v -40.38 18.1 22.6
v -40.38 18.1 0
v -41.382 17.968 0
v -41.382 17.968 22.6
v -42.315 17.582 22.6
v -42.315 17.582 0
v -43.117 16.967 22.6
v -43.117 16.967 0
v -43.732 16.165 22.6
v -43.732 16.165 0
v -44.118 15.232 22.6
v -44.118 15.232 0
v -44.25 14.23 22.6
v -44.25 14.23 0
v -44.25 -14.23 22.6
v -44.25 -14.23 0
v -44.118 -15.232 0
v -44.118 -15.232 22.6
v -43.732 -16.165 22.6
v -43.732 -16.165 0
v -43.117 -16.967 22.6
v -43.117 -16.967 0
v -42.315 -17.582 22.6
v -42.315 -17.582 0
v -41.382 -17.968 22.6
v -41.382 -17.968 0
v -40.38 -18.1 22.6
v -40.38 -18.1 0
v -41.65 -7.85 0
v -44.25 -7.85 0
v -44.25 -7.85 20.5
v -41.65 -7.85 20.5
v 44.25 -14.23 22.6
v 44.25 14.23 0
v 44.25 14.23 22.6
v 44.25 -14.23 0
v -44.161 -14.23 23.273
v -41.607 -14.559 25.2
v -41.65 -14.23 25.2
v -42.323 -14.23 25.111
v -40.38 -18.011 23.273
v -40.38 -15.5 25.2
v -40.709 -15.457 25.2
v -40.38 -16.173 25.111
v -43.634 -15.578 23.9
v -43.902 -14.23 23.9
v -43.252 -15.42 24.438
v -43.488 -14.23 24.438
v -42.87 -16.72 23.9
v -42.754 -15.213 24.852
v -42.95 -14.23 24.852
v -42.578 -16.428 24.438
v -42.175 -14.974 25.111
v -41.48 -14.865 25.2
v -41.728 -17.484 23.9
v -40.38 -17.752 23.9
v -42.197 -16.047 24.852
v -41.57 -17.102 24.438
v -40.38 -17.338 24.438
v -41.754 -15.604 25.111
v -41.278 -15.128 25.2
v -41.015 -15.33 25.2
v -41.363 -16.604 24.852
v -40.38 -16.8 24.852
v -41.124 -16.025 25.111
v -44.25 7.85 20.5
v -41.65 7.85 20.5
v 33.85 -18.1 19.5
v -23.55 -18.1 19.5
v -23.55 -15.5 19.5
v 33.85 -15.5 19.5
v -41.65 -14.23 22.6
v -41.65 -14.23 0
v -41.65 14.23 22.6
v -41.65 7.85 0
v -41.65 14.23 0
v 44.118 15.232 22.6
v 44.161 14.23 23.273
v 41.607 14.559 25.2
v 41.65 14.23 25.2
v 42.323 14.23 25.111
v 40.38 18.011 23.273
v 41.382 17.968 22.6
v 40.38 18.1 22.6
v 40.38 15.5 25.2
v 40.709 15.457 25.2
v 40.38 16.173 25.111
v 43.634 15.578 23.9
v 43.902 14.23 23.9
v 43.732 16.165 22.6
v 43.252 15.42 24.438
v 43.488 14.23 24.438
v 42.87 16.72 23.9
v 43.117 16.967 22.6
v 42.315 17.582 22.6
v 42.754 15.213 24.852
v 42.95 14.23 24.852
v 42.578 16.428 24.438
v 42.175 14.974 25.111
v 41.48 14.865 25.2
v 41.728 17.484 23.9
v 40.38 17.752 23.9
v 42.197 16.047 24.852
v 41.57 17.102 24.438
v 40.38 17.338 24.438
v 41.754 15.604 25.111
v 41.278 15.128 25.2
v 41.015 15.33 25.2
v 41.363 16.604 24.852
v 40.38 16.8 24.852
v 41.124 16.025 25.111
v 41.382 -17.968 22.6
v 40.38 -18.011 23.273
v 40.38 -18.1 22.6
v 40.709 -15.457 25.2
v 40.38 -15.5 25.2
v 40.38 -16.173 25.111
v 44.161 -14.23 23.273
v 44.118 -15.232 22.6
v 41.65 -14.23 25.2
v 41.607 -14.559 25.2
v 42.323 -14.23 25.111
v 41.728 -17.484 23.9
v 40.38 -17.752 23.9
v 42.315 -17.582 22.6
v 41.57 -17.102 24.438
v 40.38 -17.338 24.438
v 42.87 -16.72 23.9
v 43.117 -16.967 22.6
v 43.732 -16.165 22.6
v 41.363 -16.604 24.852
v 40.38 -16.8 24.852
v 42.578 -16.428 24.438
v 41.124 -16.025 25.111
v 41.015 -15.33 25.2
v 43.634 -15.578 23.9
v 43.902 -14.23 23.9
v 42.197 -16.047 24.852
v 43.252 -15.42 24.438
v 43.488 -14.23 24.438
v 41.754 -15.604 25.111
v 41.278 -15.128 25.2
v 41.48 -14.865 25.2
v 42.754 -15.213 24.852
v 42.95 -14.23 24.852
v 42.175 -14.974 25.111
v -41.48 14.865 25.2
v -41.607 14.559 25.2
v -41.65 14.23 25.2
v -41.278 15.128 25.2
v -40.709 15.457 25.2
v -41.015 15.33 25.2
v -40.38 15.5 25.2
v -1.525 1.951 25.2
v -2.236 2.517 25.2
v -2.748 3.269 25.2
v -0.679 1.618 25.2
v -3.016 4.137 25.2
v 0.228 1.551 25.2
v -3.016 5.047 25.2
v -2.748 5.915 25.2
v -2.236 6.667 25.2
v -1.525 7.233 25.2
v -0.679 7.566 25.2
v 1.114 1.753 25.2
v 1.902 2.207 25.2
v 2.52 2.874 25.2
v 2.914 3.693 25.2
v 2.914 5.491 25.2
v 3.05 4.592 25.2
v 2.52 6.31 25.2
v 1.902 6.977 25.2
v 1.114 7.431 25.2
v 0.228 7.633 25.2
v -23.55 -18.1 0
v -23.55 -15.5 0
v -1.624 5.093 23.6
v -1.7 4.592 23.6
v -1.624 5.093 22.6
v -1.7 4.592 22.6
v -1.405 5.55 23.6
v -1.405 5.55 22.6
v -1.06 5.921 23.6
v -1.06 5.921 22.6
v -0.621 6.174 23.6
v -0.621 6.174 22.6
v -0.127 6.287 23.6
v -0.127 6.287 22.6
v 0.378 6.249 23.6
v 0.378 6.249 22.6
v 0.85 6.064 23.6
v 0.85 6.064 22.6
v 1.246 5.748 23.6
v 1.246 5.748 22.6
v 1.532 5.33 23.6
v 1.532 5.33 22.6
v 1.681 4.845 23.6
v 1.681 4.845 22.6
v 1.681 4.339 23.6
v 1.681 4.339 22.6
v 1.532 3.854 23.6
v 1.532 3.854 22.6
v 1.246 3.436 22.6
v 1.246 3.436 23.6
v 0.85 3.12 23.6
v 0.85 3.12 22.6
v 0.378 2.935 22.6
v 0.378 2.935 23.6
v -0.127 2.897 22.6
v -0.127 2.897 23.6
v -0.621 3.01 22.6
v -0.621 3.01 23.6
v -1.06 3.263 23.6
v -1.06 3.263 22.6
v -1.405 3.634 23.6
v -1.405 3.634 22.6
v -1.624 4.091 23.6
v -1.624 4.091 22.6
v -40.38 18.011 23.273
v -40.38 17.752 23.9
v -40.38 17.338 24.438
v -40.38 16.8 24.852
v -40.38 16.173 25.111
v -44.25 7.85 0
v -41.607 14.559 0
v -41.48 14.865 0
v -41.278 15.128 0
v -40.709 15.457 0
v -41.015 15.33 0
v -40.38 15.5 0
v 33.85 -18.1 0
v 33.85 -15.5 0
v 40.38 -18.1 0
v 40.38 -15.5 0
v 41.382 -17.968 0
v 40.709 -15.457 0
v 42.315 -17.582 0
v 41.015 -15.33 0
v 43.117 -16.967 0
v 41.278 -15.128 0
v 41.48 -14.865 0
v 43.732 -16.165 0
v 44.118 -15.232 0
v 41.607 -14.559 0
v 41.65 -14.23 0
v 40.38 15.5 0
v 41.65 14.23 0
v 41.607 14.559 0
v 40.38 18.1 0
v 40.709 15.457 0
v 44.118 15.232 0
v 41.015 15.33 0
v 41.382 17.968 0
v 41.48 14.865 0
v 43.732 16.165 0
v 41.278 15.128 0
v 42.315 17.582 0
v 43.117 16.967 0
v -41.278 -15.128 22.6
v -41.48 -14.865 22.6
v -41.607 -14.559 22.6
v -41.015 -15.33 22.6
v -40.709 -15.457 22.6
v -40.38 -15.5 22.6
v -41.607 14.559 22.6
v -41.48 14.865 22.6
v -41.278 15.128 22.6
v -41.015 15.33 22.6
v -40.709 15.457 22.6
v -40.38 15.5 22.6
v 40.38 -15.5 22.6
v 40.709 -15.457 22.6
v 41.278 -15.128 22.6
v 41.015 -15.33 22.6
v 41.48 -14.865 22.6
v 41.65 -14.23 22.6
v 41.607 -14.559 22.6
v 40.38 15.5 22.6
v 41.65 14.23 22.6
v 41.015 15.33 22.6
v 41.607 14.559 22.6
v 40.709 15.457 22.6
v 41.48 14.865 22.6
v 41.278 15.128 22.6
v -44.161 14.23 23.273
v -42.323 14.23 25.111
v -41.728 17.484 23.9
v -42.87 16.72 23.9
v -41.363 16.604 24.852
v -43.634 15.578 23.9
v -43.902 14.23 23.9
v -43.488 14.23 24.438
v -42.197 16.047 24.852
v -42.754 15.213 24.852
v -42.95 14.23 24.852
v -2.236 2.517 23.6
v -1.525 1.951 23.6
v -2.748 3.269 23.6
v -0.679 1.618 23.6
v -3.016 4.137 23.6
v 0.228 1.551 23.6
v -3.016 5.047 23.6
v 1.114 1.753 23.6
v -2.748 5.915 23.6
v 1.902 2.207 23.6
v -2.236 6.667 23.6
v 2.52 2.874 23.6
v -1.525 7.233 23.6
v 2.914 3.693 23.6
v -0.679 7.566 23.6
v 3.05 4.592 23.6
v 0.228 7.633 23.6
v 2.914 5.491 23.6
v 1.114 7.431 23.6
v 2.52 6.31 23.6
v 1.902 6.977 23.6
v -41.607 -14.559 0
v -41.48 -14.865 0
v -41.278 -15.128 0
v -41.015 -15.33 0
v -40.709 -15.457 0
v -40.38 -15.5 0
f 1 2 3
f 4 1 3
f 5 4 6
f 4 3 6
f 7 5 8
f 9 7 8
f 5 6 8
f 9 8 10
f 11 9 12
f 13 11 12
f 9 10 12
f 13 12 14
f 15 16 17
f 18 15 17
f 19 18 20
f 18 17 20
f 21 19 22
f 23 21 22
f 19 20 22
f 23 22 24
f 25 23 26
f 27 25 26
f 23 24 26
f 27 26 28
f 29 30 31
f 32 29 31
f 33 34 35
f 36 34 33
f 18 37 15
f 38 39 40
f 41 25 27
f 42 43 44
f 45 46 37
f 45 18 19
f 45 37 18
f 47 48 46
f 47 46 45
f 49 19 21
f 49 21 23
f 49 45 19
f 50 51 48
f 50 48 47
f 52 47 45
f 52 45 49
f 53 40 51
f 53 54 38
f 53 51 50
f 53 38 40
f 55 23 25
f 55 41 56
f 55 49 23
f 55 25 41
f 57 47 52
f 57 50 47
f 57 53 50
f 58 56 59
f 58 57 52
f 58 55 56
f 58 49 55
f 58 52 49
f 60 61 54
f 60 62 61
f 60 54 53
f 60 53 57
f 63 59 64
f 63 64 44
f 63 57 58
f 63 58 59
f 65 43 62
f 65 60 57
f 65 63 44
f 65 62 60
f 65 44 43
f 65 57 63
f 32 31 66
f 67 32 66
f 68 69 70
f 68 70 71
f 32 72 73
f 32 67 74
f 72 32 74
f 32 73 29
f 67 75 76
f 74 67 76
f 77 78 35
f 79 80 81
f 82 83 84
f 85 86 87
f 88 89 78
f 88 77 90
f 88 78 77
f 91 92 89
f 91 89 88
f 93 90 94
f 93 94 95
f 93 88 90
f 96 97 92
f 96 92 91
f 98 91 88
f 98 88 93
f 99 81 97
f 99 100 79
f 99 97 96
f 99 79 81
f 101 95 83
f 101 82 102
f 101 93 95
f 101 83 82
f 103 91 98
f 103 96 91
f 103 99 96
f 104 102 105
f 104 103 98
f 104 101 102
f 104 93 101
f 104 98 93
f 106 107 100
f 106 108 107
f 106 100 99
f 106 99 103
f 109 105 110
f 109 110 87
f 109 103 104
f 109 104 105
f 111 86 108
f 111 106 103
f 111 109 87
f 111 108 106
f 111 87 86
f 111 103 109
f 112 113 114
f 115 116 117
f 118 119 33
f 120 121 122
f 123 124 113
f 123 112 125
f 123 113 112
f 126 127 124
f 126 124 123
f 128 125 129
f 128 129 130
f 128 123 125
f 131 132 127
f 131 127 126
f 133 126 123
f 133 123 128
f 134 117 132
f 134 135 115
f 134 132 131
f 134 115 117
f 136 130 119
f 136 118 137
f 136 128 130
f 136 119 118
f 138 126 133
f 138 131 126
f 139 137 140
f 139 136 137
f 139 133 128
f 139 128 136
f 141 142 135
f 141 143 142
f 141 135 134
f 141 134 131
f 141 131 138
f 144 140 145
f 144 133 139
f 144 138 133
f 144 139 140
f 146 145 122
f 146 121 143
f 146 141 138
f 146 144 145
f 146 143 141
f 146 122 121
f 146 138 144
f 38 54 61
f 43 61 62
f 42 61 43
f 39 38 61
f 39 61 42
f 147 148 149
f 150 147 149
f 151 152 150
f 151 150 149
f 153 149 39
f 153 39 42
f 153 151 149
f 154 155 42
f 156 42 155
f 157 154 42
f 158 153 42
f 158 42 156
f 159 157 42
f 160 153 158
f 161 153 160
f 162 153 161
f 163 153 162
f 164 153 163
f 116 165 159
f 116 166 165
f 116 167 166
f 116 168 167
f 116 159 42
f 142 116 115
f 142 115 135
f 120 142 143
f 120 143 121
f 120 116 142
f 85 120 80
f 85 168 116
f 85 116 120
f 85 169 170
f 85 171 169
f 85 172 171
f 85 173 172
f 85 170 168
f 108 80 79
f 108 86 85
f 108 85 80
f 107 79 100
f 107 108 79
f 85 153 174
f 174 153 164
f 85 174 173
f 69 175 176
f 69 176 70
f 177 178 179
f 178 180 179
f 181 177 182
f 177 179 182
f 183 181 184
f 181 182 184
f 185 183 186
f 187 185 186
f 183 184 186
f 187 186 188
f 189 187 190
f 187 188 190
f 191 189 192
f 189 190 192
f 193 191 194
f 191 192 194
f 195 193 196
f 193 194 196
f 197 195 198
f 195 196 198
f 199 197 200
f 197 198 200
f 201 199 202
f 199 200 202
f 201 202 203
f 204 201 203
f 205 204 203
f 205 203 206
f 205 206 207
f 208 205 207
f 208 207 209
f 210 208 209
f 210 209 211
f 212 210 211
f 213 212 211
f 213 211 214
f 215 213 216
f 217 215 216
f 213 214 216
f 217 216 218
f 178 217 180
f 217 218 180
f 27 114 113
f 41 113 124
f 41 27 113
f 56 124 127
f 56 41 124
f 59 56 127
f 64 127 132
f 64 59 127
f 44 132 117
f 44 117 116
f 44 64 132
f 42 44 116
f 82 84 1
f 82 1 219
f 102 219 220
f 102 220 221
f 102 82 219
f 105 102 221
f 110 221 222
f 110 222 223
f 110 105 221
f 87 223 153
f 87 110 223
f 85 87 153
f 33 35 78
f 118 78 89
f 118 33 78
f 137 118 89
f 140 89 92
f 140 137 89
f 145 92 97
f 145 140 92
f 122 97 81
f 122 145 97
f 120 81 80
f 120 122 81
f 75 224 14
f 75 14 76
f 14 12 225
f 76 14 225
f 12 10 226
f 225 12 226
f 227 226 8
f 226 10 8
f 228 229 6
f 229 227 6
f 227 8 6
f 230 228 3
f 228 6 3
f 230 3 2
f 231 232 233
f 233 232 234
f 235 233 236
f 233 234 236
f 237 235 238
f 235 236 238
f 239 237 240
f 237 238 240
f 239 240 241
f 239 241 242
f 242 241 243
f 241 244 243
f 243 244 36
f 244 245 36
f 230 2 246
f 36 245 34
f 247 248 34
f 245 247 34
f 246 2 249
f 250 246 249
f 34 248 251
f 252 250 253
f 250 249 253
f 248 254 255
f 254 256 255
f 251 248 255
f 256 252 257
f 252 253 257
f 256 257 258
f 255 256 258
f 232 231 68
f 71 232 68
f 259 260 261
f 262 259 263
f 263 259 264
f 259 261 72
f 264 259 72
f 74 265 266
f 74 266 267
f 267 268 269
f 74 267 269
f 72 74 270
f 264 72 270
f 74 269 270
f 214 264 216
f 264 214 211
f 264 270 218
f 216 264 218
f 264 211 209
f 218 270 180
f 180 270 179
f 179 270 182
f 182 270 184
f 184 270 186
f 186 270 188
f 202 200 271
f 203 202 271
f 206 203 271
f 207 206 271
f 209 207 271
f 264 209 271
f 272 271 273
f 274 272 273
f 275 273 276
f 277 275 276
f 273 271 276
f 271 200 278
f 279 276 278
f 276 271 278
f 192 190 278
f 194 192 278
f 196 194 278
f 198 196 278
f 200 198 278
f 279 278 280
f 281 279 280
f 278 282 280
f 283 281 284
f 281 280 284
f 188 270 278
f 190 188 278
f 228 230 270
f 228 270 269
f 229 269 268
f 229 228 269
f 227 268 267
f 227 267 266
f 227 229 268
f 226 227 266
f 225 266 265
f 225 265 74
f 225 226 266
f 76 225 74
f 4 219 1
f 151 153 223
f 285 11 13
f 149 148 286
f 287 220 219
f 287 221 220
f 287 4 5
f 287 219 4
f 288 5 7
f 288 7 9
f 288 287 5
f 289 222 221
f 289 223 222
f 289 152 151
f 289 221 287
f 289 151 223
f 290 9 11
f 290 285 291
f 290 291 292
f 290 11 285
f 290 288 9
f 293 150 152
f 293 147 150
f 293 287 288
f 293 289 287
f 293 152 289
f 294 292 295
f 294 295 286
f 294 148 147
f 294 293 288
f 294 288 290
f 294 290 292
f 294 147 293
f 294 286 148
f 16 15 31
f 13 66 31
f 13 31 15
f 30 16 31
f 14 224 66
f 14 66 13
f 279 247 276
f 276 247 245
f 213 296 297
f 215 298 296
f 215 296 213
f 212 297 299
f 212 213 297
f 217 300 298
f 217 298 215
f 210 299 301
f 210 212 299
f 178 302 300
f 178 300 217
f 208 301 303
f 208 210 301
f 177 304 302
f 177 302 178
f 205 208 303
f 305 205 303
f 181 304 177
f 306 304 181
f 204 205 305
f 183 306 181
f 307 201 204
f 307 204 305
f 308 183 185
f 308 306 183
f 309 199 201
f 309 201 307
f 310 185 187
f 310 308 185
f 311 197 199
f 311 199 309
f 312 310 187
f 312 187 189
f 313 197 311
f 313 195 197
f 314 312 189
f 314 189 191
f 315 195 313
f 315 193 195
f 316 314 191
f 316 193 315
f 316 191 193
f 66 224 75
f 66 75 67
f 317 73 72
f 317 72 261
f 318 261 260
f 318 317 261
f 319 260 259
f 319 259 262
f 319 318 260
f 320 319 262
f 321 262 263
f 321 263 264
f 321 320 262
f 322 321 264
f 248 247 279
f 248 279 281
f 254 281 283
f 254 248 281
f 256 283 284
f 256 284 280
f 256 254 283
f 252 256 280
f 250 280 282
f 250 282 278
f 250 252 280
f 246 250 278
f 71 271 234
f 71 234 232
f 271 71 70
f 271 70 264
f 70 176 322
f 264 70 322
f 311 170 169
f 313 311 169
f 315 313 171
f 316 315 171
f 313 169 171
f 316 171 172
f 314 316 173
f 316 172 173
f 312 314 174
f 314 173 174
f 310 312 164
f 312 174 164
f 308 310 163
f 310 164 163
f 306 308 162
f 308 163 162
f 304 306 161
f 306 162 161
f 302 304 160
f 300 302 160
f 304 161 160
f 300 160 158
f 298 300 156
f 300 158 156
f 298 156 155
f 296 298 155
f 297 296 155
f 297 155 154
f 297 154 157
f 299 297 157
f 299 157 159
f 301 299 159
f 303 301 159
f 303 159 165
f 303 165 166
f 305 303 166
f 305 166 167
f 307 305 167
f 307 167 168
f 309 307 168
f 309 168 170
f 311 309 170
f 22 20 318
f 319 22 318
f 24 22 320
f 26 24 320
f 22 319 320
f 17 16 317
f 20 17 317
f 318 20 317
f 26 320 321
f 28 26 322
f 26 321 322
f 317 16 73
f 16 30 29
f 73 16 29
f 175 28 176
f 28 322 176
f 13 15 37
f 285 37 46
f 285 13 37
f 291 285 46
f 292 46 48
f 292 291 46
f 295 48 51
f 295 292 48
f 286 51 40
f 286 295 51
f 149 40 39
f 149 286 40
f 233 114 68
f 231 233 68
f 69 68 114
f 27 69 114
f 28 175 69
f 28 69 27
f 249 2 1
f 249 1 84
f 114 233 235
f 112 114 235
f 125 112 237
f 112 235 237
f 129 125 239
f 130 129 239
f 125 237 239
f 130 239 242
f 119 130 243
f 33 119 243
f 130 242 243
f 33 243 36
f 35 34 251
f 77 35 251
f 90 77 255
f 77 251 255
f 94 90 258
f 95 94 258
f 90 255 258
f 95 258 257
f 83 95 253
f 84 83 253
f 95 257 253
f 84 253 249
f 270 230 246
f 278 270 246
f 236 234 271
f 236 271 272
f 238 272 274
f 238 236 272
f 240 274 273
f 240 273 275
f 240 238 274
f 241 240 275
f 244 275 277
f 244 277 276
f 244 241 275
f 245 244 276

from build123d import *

# Parameters (mm, degrees)
PAD_DEPTH        = 22.6
THICKNESS_T      = 2.6
SKETCH001_W      = 57.4
SKETCH001_H      = 19.5
POCKET_DEPTH     = 5
SKETCH002_W      = 15.7
SKETCH002_H      = 20.5
POCKET001_DEPTH  = 5
HOLE_D           = 3.4
HOLE_DEPTH       = 25
HOLE_CBORE_D     = 6.1
HOLE_CBORE_DEPTH = 1.6
HOLE_TIPS_R      = 1.7


with BuildPart() as part:
    # Sketch → Pad (new body)
    with BuildSketch(Plane.XY):
        with BuildLine():
            ThreePointArc((-40.38, 15.5), (-41.278026, 15.128026), (-41.65, 14.23))
            Line((-41.65, -14.23), (-41.65, 14.23))
            ThreePointArc((-41.65, -14.23), (-41.278026, -15.128026), (-40.38, -15.5))
            Line((40.38, -15.5), (-40.38, -15.5))
            ThreePointArc((40.38, -15.5), (41.278026, -15.128026), (41.65, -14.23))
            Line((41.65, 14.23), (41.65, -14.23))
            ThreePointArc((41.65, 14.23), (41.278026, 15.128026), (40.38, 15.5))
            Line((-40.38, 15.5), (40.38, 15.5))
        make_face()
    extrude(amount=PAD_DEPTH)

    # Thickness
    thickness_openings = [part.faces().sort_by_distance(p)[0] for p in [
        (0, 0, 0),
    ]]
    offset(amount=THICKNESS_T, openings=thickness_openings)

    # Sketch001 → Pocket (cut)
    with BuildSketch(Plane.XZ.offset(18.1)):
        with Locations((5.15, 9.75)):
            Rectangle(SKETCH001_W, SKETCH001_H)
    extrude(amount=-POCKET_DEPTH, mode=Mode.SUBTRACT)

    # Sketch002 → Pocket001 (cut)
    with BuildSketch(Plane.YZ.offset(-44.25)):
        with Locations((0, 10.25)):
            Rectangle(SKETCH002_W, SKETCH002_H)
    extrude(amount=POCKET001_DEPTH, mode=Mode.SUBTRACT)

    # Hole
    with Locations(Plane.XY.offset(25.2)):
        with Locations((0, 4.592)):
            CounterBoreHole(HOLE_D / 2, HOLE_CBORE_D / 2, HOLE_CBORE_DEPTH, depth=HOLE_DEPTH)

    # Hole tips → Hole tip 1 section 0
    with BuildSketch(Plane.XY.offset(0.2), mode=Mode.PRIVATE) as hole_tip_1_s0:
        with Locations((0, 4.592)):
            Circle(HOLE_TIPS_R)
    loft([hole_tip_1_s0.sketch, Vertex(0, 4.592, -0.821463)], mode=Mode.SUBTRACT)


solid = part.part
